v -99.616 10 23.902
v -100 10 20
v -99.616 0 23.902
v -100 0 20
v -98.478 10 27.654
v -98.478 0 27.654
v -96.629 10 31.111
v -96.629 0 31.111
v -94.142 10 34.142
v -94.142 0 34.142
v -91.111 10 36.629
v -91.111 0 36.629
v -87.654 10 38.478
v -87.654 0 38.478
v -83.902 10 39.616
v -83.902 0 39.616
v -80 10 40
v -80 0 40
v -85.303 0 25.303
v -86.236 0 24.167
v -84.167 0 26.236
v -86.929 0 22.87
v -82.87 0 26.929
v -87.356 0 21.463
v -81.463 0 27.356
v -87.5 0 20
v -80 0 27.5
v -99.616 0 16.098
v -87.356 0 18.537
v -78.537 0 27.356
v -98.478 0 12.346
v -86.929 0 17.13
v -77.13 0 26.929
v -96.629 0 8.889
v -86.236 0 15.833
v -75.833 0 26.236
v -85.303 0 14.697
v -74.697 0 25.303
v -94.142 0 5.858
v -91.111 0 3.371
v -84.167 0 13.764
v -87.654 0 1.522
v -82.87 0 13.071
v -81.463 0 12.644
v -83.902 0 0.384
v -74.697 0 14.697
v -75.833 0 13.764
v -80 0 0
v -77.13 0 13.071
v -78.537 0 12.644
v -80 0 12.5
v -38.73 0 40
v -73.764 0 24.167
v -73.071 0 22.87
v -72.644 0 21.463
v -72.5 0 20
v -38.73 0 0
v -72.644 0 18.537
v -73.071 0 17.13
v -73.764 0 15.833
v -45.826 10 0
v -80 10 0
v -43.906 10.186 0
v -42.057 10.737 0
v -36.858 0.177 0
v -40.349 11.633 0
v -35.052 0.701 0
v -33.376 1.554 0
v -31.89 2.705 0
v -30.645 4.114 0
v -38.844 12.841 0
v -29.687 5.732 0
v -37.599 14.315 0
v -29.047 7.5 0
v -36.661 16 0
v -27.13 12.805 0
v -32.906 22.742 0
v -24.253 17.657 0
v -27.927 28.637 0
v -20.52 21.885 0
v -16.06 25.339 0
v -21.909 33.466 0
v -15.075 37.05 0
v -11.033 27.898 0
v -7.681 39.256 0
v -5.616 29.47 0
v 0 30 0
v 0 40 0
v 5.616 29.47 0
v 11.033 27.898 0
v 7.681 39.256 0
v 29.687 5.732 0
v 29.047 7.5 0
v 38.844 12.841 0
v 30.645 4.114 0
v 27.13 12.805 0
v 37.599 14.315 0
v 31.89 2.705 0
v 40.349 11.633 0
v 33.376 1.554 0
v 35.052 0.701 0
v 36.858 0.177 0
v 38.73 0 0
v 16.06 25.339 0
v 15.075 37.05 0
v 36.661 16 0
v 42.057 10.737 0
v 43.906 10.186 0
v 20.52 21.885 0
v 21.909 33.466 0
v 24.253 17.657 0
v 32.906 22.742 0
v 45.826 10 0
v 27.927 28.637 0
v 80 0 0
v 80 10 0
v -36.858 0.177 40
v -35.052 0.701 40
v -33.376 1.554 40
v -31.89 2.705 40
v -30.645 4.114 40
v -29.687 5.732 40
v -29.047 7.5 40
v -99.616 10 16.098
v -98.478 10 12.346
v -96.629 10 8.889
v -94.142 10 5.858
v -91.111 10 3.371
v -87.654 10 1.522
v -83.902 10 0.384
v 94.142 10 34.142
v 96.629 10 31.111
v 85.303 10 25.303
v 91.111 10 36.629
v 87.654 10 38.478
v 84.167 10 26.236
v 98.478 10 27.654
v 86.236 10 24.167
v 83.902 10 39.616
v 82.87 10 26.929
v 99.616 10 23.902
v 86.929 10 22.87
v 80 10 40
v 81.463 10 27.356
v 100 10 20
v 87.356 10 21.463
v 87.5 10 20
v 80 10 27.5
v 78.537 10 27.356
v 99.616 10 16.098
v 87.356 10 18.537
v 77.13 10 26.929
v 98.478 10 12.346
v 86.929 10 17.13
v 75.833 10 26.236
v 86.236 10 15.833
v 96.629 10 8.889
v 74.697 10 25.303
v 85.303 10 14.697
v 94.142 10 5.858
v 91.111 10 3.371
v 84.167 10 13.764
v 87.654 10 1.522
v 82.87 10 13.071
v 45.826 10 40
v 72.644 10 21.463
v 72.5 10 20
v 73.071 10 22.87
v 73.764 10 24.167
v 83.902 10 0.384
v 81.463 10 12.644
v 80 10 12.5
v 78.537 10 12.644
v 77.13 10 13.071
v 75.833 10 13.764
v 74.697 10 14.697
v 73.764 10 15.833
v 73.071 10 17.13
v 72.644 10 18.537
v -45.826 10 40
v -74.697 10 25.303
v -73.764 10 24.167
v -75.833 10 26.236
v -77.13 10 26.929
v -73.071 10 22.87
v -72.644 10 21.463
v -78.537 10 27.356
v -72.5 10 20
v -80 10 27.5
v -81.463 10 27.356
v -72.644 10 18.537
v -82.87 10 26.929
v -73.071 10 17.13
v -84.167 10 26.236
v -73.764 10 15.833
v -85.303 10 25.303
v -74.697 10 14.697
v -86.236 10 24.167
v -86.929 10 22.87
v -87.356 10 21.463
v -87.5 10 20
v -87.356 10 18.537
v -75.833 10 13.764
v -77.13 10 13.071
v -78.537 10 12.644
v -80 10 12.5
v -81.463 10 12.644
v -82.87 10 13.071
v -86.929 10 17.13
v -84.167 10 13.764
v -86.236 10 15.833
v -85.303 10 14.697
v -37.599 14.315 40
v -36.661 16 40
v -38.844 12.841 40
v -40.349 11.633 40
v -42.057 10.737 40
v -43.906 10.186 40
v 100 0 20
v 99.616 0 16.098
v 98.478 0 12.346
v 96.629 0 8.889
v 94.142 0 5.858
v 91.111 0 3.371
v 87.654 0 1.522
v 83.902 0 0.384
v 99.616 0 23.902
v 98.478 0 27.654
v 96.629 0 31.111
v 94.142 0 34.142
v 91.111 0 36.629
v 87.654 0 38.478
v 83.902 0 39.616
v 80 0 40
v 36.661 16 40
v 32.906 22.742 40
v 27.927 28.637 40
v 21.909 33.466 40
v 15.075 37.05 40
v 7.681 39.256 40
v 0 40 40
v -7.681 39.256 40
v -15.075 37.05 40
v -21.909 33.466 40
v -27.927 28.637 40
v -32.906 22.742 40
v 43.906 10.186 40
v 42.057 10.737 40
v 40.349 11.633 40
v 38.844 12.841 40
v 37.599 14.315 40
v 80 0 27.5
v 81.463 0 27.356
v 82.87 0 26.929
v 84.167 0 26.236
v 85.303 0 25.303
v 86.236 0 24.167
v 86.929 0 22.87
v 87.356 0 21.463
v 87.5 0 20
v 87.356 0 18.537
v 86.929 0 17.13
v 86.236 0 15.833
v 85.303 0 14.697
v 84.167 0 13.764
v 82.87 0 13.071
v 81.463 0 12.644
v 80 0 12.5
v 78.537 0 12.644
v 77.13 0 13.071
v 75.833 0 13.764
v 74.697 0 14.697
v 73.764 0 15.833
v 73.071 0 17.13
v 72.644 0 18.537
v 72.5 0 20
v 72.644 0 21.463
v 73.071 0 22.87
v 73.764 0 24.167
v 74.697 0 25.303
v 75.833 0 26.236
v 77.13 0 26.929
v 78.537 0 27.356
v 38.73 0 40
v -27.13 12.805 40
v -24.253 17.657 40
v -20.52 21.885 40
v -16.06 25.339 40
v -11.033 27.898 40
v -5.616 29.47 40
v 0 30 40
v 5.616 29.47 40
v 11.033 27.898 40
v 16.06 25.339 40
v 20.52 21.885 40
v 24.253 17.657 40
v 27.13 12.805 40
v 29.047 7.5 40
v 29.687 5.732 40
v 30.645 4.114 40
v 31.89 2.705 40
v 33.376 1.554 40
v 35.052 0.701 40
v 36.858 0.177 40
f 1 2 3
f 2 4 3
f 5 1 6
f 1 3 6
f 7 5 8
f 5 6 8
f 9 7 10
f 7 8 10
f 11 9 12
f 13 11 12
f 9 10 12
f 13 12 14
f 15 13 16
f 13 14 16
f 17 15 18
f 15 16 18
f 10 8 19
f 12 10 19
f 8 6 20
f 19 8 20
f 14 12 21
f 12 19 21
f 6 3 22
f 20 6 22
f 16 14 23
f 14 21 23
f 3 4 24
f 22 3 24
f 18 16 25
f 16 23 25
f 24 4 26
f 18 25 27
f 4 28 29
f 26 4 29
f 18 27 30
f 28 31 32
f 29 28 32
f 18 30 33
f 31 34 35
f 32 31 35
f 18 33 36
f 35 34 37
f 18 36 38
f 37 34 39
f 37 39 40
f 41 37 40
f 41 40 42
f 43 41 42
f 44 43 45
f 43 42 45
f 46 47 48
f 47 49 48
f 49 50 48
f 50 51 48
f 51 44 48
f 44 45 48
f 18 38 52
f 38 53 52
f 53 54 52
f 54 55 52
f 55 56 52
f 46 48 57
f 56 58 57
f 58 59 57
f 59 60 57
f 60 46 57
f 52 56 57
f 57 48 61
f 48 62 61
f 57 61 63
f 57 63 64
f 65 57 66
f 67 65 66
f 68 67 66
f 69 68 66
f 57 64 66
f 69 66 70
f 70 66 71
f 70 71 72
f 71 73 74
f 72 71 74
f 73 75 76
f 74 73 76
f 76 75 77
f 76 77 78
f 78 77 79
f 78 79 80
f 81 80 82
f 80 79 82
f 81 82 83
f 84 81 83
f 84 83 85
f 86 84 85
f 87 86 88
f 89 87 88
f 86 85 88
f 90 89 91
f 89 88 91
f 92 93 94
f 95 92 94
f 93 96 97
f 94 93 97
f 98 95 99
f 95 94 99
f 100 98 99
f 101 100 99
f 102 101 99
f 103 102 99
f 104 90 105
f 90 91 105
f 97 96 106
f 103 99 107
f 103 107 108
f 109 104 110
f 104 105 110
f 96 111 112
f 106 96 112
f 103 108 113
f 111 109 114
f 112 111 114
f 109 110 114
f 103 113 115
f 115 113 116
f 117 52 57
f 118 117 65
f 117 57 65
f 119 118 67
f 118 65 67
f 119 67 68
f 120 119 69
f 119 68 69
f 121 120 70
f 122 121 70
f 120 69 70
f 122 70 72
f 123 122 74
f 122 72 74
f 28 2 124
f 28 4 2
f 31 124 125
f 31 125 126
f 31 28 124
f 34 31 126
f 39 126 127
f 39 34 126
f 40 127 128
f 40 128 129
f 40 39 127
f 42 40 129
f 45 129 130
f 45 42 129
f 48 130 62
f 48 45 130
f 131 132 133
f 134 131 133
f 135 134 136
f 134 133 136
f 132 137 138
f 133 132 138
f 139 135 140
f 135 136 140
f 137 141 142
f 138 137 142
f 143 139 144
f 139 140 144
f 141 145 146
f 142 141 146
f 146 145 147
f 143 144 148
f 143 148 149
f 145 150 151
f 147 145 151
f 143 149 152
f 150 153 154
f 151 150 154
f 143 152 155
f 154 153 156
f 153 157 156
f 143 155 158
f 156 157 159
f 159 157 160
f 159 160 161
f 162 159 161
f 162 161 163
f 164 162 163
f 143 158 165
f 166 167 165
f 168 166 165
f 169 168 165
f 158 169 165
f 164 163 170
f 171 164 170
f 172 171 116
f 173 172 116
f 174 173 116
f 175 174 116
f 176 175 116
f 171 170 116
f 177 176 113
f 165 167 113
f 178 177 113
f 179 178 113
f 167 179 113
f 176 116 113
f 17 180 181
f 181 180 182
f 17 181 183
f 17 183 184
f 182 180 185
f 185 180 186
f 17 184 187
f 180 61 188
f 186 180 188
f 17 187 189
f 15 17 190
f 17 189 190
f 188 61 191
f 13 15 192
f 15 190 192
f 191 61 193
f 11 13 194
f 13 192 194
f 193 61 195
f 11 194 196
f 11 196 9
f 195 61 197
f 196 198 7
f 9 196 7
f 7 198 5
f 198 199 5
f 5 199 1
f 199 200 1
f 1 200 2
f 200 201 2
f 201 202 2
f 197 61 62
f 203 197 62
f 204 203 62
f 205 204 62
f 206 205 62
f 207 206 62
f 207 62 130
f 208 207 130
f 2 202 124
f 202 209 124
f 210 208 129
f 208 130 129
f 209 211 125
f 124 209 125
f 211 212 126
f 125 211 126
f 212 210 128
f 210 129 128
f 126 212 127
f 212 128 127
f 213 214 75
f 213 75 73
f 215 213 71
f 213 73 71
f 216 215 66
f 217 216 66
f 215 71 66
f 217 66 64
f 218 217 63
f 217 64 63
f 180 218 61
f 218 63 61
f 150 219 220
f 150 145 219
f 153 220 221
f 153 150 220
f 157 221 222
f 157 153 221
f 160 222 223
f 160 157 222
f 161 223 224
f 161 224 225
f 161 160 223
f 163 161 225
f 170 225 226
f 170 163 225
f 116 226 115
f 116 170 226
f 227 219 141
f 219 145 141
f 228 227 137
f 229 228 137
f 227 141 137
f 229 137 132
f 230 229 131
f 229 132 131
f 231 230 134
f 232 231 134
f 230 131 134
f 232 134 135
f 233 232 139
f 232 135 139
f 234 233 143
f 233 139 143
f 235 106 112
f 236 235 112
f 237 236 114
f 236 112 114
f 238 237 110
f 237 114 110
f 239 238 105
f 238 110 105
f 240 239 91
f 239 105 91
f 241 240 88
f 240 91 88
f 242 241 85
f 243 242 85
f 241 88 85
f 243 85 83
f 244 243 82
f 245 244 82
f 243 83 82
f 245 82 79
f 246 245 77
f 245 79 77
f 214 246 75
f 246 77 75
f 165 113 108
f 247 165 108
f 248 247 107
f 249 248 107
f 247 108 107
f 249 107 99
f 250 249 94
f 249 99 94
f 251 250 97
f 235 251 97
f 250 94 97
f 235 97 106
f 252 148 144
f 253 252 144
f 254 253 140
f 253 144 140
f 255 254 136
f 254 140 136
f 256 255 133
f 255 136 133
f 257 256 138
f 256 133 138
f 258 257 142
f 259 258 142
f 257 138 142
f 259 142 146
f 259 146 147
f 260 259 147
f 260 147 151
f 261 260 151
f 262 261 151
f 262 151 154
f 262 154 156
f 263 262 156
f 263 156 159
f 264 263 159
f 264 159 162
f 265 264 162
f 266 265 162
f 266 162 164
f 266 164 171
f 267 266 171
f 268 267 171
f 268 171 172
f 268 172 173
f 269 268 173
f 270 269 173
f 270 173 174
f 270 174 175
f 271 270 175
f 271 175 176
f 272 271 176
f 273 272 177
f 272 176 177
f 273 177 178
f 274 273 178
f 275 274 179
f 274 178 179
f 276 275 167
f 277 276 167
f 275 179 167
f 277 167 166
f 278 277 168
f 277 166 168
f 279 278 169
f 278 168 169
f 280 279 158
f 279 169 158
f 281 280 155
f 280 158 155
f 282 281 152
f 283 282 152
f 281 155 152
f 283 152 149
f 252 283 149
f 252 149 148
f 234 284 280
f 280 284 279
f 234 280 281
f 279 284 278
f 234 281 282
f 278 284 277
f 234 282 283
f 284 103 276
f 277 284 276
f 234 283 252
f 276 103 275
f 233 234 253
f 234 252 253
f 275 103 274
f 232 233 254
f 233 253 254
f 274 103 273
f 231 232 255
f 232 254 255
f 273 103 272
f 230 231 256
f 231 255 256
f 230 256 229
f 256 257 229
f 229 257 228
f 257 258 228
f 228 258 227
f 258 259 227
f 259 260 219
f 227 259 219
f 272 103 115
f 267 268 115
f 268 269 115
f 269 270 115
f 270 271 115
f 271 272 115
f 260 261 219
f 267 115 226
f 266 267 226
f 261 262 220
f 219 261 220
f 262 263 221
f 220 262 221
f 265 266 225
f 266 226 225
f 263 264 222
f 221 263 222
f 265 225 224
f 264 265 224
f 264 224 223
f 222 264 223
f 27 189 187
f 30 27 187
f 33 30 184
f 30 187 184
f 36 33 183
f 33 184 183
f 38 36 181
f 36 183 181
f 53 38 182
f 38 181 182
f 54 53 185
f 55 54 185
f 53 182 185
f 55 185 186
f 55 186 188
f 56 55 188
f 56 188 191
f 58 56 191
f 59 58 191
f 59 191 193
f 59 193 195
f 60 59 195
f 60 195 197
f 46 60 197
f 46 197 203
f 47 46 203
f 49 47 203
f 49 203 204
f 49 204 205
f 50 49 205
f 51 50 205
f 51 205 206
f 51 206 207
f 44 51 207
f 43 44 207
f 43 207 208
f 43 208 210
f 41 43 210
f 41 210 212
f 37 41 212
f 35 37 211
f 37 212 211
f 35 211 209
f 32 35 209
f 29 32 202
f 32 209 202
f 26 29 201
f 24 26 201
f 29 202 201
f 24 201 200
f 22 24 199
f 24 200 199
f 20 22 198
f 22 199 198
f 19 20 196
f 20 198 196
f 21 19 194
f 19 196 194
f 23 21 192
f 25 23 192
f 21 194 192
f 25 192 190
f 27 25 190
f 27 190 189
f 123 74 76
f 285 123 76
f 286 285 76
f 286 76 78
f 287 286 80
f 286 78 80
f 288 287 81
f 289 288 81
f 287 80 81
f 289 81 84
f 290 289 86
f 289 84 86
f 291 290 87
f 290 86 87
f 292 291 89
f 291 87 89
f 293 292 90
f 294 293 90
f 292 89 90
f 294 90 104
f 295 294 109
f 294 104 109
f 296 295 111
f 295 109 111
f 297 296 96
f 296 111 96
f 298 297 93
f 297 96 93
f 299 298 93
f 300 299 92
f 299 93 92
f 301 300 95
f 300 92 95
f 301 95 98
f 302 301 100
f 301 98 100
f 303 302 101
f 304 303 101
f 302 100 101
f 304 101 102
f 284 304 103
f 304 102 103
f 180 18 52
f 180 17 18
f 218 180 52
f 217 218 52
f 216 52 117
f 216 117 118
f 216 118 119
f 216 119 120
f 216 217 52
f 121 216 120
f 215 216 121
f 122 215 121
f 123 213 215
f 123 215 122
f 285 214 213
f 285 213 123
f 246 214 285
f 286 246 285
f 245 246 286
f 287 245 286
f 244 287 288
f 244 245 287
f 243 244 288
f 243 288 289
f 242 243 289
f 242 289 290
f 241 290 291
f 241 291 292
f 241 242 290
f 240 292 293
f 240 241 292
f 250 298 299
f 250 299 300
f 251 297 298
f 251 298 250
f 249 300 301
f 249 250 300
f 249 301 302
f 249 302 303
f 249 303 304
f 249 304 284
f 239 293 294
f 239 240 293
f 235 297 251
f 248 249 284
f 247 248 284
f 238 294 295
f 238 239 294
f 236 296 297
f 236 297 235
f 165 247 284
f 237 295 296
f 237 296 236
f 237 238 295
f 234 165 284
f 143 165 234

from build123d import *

# Parameters (mm, degrees)
BOSS_EXTRUDE1_DEPTH = 40
FILLET1_R           = 20
SKETCH2_R           = 7.5
CUT_EXTRUDE1_DEPTH  = 40


with BuildPart() as part:
    # Sketch1 → Boss-Extrude1 (new body)
    with BuildSketch(Plane.XY):
        with BuildLine():
            Line((-100, 0), (-38.729833462, 0))
            ThreePointArc((-38.729833462, 0), (-32.606109105, 2.09430585), (-29.047375097, 7.5))
            ThreePointArc((-29.047375097, 7.5), (0, 30), (29.047375097, 7.5))
            ThreePointArc((29.047375097, 7.5), (32.606109105, 2.09430585), (38.729833462, 0))
            Line((38.729833462, 0), (100, 0))
            Line((100, 0), (100, 10))
            Line((100, 10), (45.82575695, 10))
            ThreePointArc((45.82575695, 10), (40.348531375, 11.633399735), (36.66060556, 16))
            ThreePointArc((36.66060556, 16), (0, 40), (-36.66060556, 16))
            ThreePointArc((-36.66060556, 16), (-40.348531375, 11.633399735), (-45.82575695, 10))
            Line((-45.82575695, 10), (-100, 10))
            Line((-100, 10), (-100, 0))
        make_face()
    extrude(amount=BOSS_EXTRUDE1_DEPTH)

    # Fillet1
    fillet1_edges = [part.edges().sort_by_distance(p)[0] for p in [
        (100, 5, 0),
        (100, 5, 40),
        (-100, 5, 0),
        (-100, 5, 40),
    ]]
    fillet(fillet1_edges, radius=FILLET1_R - 0.0001)  # a hair under: the kernel refuses the full size

    # Sketch2 → Cut-Extrude1 (cut)
    with BuildSketch(Plane(origin=(0, 10, 0), x_dir=(1, 0, 0), z_dir=(0, 1, 0))):
        with Locations(Location((-80, -20, 0), (0, 0, 270))):
            Circle(SKETCH2_R)
        with Locations(Location((80, -20, 0), (0, 0, 270))):
            Circle(SKETCH2_R)
    extrude(amount=-CUT_EXTRUDE1_DEPTH, mode=Mode.SUBTRACT)


solid = part.part
